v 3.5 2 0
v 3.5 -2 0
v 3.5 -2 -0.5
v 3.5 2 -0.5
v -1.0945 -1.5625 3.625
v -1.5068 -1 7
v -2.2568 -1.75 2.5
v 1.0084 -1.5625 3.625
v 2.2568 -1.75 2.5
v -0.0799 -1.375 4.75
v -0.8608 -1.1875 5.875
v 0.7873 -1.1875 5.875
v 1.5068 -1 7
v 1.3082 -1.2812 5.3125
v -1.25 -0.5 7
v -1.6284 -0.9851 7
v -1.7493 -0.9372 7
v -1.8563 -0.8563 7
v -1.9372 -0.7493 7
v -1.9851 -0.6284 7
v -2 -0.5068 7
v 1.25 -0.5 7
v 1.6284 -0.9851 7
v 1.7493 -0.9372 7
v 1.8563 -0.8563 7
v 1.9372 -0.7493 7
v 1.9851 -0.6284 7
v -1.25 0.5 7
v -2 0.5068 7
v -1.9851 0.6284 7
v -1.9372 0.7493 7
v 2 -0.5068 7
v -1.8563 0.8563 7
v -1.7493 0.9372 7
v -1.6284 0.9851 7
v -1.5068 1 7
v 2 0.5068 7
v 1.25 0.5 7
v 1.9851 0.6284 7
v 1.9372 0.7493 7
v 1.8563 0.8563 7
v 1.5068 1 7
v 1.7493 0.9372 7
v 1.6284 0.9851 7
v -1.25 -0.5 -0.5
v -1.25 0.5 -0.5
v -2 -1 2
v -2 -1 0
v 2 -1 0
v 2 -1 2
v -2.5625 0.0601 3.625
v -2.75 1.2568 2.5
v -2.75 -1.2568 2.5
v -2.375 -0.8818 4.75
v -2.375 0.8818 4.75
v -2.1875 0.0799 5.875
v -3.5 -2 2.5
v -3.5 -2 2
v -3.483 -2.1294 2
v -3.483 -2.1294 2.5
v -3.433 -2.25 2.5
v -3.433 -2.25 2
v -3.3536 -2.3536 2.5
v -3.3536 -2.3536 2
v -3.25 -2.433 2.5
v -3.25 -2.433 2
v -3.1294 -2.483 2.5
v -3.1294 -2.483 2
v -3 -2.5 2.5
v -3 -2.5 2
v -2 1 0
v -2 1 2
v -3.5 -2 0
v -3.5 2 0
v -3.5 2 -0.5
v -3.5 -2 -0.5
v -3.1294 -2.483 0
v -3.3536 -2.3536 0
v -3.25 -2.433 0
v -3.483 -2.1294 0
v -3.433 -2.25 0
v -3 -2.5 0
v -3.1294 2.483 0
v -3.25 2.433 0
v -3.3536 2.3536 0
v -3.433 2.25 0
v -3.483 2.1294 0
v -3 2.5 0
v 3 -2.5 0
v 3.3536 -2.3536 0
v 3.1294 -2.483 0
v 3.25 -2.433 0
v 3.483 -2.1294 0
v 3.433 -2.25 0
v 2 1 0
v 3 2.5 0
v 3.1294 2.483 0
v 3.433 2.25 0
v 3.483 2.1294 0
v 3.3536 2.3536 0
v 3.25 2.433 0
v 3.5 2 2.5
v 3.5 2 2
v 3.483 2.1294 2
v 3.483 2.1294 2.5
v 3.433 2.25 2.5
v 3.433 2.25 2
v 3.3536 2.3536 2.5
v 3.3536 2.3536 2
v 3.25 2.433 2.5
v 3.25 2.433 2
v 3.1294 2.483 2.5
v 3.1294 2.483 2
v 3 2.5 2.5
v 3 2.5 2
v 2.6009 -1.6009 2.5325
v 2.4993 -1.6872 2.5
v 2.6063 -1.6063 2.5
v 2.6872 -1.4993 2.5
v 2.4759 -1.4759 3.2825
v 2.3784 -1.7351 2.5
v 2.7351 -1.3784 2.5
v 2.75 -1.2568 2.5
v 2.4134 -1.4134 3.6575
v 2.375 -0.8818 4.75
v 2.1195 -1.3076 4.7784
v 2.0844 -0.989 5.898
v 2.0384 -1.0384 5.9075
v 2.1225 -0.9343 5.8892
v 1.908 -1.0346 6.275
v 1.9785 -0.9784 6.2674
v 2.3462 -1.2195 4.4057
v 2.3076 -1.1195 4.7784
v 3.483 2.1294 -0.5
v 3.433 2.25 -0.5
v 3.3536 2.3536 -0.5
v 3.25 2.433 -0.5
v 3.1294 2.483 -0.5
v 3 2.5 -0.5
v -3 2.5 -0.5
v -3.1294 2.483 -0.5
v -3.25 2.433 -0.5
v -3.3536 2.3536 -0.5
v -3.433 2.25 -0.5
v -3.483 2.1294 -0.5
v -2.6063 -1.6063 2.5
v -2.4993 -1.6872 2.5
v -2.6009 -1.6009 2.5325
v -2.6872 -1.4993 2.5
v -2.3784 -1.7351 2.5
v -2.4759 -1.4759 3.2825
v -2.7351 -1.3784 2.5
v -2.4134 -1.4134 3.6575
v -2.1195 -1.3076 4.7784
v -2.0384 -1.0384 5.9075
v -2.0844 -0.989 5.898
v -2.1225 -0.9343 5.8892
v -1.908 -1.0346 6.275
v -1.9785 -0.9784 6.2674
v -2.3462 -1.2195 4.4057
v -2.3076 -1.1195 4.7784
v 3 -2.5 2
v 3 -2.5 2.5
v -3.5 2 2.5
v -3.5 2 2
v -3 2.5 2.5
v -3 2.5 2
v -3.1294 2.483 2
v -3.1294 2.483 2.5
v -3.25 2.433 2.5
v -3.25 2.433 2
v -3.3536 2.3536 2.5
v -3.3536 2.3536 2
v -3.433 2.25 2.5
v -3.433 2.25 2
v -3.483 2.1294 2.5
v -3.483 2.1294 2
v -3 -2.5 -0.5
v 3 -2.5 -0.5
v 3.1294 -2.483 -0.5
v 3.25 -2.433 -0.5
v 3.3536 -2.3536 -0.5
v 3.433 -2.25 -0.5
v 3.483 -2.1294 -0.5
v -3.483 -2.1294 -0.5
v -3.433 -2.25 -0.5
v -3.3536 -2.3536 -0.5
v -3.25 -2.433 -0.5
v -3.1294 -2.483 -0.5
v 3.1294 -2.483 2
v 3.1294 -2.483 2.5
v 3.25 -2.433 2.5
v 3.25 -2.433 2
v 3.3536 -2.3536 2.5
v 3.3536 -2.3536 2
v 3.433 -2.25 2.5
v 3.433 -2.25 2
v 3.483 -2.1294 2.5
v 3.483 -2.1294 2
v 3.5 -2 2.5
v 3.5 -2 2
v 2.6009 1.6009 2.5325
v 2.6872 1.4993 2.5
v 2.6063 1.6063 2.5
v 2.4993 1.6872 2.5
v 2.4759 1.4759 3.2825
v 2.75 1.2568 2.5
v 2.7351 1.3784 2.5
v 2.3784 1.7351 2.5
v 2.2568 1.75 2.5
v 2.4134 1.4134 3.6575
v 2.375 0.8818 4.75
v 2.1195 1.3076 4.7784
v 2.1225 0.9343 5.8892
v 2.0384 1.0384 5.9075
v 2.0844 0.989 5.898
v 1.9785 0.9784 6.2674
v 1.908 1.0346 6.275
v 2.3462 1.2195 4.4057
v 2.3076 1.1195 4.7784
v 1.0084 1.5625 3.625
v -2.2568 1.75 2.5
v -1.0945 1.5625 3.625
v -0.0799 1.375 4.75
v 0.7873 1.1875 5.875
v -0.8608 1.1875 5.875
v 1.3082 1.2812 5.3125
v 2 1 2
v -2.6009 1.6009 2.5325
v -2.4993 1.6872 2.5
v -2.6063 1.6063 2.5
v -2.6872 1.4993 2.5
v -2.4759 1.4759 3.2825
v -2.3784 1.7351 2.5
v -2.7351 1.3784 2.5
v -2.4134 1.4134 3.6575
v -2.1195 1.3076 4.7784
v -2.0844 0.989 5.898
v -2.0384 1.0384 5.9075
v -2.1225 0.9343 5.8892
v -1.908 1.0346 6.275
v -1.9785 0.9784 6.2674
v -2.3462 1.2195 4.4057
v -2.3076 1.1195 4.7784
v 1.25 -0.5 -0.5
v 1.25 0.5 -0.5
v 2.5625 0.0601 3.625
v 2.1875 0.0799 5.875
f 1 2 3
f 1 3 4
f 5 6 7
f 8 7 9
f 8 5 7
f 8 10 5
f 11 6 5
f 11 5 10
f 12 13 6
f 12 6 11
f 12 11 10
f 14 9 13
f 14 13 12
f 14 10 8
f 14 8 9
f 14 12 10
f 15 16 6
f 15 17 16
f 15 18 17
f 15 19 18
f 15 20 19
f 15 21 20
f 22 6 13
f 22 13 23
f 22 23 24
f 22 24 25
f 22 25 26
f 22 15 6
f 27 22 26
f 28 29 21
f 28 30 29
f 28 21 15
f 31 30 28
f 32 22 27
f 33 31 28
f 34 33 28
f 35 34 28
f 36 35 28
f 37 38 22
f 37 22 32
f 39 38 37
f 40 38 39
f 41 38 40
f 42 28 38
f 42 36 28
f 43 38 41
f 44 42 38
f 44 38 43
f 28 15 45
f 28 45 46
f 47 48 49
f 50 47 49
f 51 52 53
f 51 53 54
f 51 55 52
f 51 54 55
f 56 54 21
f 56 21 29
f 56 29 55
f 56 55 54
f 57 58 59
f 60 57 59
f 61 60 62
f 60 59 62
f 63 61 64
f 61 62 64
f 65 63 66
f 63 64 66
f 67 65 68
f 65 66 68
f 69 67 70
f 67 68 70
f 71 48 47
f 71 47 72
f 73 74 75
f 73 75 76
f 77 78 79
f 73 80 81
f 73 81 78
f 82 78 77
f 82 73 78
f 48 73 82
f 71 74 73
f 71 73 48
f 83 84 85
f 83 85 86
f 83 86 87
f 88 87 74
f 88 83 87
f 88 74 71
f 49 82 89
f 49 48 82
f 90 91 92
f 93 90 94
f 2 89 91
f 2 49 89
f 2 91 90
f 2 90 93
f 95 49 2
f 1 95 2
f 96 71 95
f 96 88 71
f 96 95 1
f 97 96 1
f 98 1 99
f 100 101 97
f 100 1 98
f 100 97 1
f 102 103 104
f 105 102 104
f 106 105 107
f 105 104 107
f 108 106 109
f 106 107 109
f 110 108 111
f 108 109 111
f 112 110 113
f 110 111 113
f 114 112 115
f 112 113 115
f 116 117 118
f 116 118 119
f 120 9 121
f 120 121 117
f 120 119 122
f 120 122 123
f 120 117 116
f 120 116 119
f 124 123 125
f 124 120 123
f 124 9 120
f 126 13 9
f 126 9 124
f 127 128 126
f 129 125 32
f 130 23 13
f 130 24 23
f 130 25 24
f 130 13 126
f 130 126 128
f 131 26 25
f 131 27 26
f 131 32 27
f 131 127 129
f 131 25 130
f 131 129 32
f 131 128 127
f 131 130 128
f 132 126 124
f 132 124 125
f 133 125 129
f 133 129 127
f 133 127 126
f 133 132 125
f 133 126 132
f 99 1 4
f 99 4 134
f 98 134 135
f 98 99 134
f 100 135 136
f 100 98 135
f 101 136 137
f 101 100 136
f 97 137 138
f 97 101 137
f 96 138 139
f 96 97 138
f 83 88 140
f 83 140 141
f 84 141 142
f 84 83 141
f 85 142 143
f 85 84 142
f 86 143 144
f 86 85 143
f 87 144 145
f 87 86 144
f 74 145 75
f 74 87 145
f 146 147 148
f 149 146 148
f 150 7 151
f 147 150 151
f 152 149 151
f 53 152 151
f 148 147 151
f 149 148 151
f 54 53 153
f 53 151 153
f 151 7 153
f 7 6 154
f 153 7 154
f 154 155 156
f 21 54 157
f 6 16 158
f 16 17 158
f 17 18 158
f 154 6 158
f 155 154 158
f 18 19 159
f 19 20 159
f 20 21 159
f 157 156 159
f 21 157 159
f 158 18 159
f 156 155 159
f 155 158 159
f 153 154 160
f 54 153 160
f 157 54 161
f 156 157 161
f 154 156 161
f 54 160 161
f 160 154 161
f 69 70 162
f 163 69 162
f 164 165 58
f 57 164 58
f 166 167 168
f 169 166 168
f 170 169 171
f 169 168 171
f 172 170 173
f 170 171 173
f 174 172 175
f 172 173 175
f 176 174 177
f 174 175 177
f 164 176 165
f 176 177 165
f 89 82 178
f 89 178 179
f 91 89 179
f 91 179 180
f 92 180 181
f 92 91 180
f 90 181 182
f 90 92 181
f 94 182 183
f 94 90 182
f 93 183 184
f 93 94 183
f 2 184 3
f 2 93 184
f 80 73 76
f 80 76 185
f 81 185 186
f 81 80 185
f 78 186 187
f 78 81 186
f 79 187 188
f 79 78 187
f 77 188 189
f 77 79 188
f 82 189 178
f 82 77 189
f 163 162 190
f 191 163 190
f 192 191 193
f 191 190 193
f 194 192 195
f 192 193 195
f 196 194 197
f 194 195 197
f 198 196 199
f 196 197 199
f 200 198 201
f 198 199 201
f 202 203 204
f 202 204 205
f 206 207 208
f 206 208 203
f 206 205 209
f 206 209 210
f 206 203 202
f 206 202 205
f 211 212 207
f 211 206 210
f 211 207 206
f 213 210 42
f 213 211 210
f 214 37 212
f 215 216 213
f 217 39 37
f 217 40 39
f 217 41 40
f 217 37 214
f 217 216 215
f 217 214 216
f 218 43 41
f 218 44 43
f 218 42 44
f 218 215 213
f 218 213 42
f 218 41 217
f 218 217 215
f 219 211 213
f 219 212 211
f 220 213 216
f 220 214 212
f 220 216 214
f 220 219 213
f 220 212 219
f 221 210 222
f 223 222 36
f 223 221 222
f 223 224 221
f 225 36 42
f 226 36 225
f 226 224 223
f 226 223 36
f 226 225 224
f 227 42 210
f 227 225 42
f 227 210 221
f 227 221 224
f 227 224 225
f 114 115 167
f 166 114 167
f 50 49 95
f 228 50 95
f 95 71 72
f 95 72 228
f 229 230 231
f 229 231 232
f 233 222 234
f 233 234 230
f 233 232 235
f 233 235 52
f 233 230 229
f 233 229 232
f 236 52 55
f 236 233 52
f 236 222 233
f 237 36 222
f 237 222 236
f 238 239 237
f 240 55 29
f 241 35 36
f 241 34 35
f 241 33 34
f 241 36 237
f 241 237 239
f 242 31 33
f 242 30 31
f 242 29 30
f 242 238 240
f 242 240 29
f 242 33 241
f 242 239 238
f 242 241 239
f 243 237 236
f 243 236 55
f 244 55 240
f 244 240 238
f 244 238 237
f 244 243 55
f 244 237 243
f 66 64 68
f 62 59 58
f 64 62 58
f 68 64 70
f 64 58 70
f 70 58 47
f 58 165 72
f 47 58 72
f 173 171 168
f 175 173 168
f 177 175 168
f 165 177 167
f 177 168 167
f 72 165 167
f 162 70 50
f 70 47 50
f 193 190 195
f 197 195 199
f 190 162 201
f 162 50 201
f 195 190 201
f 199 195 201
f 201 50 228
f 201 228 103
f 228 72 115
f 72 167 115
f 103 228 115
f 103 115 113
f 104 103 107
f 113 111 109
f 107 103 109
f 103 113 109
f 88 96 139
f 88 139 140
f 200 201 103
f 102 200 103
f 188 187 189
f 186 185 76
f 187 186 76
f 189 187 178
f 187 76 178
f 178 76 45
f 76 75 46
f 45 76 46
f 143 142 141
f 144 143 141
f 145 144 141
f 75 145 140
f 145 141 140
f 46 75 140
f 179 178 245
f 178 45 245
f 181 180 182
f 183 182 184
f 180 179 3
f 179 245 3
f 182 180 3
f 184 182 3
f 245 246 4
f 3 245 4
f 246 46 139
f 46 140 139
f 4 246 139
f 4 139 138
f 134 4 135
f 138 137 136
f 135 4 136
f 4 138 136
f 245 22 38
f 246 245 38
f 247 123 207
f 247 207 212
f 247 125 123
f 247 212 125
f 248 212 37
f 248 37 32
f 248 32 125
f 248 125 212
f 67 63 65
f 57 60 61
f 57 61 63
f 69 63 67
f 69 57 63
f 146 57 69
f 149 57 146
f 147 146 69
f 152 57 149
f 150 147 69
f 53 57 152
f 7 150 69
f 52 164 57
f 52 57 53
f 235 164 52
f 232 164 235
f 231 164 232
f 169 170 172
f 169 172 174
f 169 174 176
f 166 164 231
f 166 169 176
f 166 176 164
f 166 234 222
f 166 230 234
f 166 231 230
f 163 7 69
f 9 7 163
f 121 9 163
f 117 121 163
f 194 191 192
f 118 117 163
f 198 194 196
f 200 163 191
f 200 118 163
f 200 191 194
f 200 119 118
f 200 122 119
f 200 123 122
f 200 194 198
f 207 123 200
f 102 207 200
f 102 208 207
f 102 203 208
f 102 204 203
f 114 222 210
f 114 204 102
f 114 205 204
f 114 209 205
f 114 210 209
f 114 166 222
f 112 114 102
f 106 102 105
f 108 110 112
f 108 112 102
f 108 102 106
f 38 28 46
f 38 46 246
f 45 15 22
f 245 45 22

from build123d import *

# Parameters (mm, degrees)
ESQUISSE1_W             = 4
ESQUISSE1_H             = 2
BASE_EXTRUSION_DEPTH    = 2
BOSS_EXTRU_1_DEPTH      = 0.5
BOSS_EXTRU_2_DEPTH      = 0.5
ESQUISSE4_W             = 5.5
ESQUISSE4_H             = 3.5
ESQUISSE5_W             = 4
ESQUISSE5_H             = 2
CONG_1_R                = 0.5
ESQUISSE6_W             = 2.5
ESQUISSE6_H             = 1
ENL_V_MAT_EXTRU_1_DEPTH = 8.5


with BuildPart() as part:
    # Esquisse1 → Base-Extrusion (new body)
    with BuildSketch(Plane.XY):
        Rectangle(ESQUISSE1_W, ESQUISSE1_H)
    extrude(amount=BASE_EXTRUSION_DEPTH)

    # Esquisse2 → Boss.-Extru.1 (add)
    with BuildSketch(Plane(origin=(0, 0, 0), x_dir=(-1, 0, 0), z_dir=(0, 0, -1))):
        with BuildLine():
            Line((-3, 2.5), (3, 2.5))
            ThreePointArc((3, 2.5), (3.353553391, 2.353553391), (3.5, 2))
            Line((3.5, 2), (3.5, -2))
            ThreePointArc((3.5, -2), (3.353553391, -2.353553391), (3, -2.5))
            Line((3, -2.5), (-3, -2.5))
            ThreePointArc((-3, -2.5), (-3.353553391, -2.353553391), (-3.5, -2))
            Line((-3.5, -2), (-3.5, 2))
            ThreePointArc((-3.5, 2), (-3.353553391, 2.353553391), (-3, 2.5))
        make_face()
    extrude(amount=BOSS_EXTRU_1_DEPTH)

    # Esquisse3 → Boss.-Extru.2 (add)
    with BuildSketch(Plane.XY.offset(2)):
        with BuildLine():
            Line((-3, -2.5), (3, -2.5))
            ThreePointArc((3, -2.5), (3.353553391, -2.353553391), (3.5, -2))
            Line((3.5, -2), (3.5, 2))
            ThreePointArc((3.5, 2), (3.353553391, 2.353553391), (3, 2.5))
            Line((3, 2.5), (-3, 2.5))
            ThreePointArc((-3, 2.5), (-3.353553391, 2.353553391), (-3.5, 2))
            Line((-3.5, 2), (-3.5, -2))
            ThreePointArc((-3.5, -2), (-3.353553391, -2.353553391), (-3, -2.5))
        make_face()
    extrude(amount=BOSS_EXTRU_2_DEPTH)

    # Esquisse4 → Boss.-Lissage1 section 0
    with BuildSketch(Plane.XY.offset(2.5)):
        Rectangle(ESQUISSE4_W, ESQUISSE4_H)
    # Esquisse5 → Boss.-Lissage1 section 1
    with BuildSketch(Plane.XY.offset(7)):
        Rectangle(ESQUISSE5_W, ESQUISSE5_H)
    loft()

    # Congé1
    cong_1_edges = [part.edges().sort_by_distance(p)[0] for p in [
        (-2.375, 1.375, 4.75),
        (2.375, 1.375, 4.75),
        (-2.375, -1.375, 4.75),
        (2.375, -1.375, 4.75),
    ]]
    fillet(cong_1_edges, radius=CONG_1_R)

    # Esquisse6 → Enlèv. mat.-Extru.1 (cut, through all)
    with BuildSketch(Plane.XY.offset(7)):
        Rectangle(ESQUISSE6_W, ESQUISSE6_H)
    extrude(amount=-ENL_V_MAT_EXTRU_1_DEPTH, mode=Mode.SUBTRACT)


solid = part.part
